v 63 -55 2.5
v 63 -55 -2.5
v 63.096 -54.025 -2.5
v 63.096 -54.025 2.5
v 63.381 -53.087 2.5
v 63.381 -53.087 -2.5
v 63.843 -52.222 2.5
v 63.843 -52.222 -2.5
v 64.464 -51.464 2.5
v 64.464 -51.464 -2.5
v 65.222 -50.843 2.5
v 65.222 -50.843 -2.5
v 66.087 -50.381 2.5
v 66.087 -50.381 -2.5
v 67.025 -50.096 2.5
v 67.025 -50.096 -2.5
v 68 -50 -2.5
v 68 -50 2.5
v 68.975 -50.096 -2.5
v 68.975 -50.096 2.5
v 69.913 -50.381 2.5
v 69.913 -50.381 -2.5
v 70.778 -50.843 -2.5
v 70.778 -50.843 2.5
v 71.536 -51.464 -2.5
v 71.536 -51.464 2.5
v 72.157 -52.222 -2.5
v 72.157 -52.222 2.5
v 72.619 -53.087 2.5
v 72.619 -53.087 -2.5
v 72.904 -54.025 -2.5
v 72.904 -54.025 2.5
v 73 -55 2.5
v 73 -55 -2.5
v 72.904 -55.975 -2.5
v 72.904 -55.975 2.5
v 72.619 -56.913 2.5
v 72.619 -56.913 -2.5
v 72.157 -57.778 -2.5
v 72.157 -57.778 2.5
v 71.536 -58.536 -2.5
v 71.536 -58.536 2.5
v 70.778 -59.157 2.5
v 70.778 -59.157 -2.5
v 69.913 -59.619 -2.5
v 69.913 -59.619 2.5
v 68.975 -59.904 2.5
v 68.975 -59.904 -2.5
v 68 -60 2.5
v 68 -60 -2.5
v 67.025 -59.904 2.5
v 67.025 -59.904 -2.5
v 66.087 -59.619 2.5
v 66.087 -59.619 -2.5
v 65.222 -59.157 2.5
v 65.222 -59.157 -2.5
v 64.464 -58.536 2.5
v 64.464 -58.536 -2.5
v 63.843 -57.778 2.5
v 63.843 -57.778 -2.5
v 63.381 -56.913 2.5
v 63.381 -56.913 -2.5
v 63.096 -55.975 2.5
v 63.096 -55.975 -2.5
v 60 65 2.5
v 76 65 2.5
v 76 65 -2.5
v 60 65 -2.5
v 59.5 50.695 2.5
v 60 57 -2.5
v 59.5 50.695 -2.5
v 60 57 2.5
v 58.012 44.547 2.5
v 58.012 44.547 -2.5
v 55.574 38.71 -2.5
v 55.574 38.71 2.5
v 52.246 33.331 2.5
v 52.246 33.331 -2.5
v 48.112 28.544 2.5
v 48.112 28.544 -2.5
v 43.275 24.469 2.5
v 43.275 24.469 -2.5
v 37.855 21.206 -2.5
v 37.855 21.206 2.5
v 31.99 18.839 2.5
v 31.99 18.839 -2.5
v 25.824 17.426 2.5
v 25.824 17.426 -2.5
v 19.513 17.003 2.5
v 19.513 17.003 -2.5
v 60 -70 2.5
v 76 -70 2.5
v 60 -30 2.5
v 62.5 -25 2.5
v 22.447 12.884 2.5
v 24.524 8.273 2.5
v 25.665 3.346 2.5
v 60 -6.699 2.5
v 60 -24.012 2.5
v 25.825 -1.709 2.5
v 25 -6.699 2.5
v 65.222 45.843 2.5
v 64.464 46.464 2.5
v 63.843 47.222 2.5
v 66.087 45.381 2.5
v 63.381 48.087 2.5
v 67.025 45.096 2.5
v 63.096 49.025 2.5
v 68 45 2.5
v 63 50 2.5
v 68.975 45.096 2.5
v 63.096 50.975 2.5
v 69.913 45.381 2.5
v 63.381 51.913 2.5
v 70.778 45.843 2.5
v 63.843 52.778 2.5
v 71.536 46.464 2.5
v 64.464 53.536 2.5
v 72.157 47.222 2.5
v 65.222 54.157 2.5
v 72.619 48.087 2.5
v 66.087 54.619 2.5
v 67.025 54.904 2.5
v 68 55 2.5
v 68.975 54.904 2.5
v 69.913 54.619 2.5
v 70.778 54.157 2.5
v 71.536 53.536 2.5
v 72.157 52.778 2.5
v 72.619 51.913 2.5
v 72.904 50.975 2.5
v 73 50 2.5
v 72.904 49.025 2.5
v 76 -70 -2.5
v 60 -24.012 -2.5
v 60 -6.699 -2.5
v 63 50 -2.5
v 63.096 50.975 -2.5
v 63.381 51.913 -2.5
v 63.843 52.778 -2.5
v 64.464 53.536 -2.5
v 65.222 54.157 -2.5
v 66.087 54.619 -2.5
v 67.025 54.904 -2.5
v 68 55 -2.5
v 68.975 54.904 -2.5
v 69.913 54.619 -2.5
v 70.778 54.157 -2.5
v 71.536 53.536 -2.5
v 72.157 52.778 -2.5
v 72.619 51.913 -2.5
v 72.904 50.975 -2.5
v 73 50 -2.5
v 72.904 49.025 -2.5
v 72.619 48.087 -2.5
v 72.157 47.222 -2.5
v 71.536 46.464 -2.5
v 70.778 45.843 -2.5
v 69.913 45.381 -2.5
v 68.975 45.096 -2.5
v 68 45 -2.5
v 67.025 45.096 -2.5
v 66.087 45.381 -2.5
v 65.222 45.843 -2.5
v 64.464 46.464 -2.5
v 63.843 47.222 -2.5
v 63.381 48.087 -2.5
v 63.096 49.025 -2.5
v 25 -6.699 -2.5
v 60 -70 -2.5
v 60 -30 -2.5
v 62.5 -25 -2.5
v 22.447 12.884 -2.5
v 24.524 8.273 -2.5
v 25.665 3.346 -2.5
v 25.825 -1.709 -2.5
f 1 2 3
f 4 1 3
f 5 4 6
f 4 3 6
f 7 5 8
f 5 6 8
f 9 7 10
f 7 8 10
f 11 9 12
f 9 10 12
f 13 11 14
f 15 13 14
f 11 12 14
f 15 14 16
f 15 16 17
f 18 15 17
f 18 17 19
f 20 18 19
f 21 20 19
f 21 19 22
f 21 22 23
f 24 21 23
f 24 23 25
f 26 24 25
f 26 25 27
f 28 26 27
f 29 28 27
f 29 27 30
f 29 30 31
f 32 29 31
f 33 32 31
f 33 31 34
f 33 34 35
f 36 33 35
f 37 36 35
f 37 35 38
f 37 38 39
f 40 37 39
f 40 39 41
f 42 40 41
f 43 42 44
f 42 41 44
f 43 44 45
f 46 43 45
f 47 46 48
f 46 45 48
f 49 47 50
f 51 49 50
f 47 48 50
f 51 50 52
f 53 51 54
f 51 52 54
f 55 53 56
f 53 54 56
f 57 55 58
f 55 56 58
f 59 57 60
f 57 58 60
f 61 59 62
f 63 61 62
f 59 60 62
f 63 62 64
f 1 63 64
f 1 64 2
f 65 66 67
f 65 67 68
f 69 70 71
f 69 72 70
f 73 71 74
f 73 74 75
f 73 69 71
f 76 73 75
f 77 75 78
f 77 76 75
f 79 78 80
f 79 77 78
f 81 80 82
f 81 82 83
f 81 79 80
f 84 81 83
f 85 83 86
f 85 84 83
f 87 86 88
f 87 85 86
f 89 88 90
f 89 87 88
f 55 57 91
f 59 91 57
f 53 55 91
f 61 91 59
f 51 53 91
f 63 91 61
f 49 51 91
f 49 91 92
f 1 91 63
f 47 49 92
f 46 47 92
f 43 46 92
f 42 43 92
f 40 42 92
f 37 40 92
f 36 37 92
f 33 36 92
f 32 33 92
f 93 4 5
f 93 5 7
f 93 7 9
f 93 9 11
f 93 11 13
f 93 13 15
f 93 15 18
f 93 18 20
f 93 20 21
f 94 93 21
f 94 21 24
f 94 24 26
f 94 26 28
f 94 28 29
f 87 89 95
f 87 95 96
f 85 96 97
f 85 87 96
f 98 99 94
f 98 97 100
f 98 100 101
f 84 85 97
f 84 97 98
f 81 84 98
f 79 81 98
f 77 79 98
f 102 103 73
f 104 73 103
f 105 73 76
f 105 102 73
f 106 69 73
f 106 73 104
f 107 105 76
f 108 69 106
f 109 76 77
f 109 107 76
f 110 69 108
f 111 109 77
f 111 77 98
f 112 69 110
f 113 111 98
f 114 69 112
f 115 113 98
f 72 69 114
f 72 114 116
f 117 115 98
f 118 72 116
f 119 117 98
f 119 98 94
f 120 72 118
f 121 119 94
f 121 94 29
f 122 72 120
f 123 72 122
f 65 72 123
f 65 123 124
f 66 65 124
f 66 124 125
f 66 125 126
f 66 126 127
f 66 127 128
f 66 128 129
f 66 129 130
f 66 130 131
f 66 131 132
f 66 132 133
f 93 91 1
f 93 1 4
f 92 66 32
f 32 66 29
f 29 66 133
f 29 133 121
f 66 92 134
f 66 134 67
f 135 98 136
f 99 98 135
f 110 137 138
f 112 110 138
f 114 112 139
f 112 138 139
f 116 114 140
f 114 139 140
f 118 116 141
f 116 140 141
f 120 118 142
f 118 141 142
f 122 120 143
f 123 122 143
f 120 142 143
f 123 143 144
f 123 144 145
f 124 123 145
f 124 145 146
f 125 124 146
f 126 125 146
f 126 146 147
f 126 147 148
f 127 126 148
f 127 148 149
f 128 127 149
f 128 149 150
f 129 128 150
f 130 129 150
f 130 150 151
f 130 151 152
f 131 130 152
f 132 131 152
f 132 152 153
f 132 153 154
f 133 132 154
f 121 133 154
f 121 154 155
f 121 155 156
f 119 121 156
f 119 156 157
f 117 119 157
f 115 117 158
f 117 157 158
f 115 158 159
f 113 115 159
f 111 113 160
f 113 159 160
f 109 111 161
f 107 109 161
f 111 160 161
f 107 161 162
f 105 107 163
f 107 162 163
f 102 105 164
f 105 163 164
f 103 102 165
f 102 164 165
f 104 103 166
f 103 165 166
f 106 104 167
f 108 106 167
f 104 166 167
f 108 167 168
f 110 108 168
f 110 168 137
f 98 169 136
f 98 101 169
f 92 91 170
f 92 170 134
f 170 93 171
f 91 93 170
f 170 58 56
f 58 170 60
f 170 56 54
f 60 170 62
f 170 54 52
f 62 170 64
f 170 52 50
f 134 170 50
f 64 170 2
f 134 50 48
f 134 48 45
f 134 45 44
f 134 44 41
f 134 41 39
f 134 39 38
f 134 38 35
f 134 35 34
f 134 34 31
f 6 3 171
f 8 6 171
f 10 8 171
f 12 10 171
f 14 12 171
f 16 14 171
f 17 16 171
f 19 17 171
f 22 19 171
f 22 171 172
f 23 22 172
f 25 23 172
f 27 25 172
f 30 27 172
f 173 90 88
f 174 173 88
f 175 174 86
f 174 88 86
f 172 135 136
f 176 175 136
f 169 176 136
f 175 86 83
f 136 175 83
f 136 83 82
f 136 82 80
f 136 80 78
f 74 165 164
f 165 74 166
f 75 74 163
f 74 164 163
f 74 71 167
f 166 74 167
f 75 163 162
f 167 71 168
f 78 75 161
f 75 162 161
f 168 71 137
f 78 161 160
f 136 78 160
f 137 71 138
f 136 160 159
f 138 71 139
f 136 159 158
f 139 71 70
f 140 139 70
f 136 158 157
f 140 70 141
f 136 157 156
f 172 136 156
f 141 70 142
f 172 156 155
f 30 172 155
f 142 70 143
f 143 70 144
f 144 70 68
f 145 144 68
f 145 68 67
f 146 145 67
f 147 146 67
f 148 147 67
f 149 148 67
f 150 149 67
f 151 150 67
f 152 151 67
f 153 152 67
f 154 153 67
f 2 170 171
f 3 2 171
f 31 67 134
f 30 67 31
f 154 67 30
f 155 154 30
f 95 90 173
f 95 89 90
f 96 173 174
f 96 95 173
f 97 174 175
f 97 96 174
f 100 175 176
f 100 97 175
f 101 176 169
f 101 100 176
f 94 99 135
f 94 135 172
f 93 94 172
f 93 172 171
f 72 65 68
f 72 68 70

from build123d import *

# Parameters (mm, degrees)
BOSS_EXTRUDE1_DEPTH        = 2.5
F_10_0_10_DIAMETER_HOLE1_D = 10


with BuildPart() as part:
    # Sketch4 → Boss-Extrude1 (new, symmetric)
    with BuildSketch(Plane.XY):
        with BuildLine():
            Line((25, -6.698729811), (60, -6.698729811))
            Line((60, -6.698729811), (60, -24.011944979))
            Line((60, -24.011944979), (62.499998309, -25))
            Line((62.499998309, -25), (60, -30))
            Line((60, -30), (60, -70))
            Line((60, -70), (75.99999851, -70))
            Line((75.99999851, -70), (75.99999851, 62))
            Line((75.99999851, 62), (75.99999851, 65))
            Line((75.99999851, 65), (59.99999851, 65))
            Line((59.99999851, 65), (59.99999851, 62))
            Line((59.99999851, 62), (59.99999851, 57))
            ThreePointArc((59.99999851, 57), (48.111700718, 28.544206232), (19.513388562, 17.002959975))
            ThreePointArc((19.513388562, 17.002959975), (25.21513365, 5.836952637), (25, -6.698729811))
        make_face()
    extrude(amount=BOSS_EXTRUDE1_DEPTH, both=True)

    # Ø10.0 (10) Diameter Hole1 (through all)
    with Locations(Plane.XY.offset(2.5)):
        with Locations((67.99999851, 50), (67.99999851, -55)):
            Hole(F_10_0_10_DIAMETER_HOLE1_D / 2)


solid = part.part
